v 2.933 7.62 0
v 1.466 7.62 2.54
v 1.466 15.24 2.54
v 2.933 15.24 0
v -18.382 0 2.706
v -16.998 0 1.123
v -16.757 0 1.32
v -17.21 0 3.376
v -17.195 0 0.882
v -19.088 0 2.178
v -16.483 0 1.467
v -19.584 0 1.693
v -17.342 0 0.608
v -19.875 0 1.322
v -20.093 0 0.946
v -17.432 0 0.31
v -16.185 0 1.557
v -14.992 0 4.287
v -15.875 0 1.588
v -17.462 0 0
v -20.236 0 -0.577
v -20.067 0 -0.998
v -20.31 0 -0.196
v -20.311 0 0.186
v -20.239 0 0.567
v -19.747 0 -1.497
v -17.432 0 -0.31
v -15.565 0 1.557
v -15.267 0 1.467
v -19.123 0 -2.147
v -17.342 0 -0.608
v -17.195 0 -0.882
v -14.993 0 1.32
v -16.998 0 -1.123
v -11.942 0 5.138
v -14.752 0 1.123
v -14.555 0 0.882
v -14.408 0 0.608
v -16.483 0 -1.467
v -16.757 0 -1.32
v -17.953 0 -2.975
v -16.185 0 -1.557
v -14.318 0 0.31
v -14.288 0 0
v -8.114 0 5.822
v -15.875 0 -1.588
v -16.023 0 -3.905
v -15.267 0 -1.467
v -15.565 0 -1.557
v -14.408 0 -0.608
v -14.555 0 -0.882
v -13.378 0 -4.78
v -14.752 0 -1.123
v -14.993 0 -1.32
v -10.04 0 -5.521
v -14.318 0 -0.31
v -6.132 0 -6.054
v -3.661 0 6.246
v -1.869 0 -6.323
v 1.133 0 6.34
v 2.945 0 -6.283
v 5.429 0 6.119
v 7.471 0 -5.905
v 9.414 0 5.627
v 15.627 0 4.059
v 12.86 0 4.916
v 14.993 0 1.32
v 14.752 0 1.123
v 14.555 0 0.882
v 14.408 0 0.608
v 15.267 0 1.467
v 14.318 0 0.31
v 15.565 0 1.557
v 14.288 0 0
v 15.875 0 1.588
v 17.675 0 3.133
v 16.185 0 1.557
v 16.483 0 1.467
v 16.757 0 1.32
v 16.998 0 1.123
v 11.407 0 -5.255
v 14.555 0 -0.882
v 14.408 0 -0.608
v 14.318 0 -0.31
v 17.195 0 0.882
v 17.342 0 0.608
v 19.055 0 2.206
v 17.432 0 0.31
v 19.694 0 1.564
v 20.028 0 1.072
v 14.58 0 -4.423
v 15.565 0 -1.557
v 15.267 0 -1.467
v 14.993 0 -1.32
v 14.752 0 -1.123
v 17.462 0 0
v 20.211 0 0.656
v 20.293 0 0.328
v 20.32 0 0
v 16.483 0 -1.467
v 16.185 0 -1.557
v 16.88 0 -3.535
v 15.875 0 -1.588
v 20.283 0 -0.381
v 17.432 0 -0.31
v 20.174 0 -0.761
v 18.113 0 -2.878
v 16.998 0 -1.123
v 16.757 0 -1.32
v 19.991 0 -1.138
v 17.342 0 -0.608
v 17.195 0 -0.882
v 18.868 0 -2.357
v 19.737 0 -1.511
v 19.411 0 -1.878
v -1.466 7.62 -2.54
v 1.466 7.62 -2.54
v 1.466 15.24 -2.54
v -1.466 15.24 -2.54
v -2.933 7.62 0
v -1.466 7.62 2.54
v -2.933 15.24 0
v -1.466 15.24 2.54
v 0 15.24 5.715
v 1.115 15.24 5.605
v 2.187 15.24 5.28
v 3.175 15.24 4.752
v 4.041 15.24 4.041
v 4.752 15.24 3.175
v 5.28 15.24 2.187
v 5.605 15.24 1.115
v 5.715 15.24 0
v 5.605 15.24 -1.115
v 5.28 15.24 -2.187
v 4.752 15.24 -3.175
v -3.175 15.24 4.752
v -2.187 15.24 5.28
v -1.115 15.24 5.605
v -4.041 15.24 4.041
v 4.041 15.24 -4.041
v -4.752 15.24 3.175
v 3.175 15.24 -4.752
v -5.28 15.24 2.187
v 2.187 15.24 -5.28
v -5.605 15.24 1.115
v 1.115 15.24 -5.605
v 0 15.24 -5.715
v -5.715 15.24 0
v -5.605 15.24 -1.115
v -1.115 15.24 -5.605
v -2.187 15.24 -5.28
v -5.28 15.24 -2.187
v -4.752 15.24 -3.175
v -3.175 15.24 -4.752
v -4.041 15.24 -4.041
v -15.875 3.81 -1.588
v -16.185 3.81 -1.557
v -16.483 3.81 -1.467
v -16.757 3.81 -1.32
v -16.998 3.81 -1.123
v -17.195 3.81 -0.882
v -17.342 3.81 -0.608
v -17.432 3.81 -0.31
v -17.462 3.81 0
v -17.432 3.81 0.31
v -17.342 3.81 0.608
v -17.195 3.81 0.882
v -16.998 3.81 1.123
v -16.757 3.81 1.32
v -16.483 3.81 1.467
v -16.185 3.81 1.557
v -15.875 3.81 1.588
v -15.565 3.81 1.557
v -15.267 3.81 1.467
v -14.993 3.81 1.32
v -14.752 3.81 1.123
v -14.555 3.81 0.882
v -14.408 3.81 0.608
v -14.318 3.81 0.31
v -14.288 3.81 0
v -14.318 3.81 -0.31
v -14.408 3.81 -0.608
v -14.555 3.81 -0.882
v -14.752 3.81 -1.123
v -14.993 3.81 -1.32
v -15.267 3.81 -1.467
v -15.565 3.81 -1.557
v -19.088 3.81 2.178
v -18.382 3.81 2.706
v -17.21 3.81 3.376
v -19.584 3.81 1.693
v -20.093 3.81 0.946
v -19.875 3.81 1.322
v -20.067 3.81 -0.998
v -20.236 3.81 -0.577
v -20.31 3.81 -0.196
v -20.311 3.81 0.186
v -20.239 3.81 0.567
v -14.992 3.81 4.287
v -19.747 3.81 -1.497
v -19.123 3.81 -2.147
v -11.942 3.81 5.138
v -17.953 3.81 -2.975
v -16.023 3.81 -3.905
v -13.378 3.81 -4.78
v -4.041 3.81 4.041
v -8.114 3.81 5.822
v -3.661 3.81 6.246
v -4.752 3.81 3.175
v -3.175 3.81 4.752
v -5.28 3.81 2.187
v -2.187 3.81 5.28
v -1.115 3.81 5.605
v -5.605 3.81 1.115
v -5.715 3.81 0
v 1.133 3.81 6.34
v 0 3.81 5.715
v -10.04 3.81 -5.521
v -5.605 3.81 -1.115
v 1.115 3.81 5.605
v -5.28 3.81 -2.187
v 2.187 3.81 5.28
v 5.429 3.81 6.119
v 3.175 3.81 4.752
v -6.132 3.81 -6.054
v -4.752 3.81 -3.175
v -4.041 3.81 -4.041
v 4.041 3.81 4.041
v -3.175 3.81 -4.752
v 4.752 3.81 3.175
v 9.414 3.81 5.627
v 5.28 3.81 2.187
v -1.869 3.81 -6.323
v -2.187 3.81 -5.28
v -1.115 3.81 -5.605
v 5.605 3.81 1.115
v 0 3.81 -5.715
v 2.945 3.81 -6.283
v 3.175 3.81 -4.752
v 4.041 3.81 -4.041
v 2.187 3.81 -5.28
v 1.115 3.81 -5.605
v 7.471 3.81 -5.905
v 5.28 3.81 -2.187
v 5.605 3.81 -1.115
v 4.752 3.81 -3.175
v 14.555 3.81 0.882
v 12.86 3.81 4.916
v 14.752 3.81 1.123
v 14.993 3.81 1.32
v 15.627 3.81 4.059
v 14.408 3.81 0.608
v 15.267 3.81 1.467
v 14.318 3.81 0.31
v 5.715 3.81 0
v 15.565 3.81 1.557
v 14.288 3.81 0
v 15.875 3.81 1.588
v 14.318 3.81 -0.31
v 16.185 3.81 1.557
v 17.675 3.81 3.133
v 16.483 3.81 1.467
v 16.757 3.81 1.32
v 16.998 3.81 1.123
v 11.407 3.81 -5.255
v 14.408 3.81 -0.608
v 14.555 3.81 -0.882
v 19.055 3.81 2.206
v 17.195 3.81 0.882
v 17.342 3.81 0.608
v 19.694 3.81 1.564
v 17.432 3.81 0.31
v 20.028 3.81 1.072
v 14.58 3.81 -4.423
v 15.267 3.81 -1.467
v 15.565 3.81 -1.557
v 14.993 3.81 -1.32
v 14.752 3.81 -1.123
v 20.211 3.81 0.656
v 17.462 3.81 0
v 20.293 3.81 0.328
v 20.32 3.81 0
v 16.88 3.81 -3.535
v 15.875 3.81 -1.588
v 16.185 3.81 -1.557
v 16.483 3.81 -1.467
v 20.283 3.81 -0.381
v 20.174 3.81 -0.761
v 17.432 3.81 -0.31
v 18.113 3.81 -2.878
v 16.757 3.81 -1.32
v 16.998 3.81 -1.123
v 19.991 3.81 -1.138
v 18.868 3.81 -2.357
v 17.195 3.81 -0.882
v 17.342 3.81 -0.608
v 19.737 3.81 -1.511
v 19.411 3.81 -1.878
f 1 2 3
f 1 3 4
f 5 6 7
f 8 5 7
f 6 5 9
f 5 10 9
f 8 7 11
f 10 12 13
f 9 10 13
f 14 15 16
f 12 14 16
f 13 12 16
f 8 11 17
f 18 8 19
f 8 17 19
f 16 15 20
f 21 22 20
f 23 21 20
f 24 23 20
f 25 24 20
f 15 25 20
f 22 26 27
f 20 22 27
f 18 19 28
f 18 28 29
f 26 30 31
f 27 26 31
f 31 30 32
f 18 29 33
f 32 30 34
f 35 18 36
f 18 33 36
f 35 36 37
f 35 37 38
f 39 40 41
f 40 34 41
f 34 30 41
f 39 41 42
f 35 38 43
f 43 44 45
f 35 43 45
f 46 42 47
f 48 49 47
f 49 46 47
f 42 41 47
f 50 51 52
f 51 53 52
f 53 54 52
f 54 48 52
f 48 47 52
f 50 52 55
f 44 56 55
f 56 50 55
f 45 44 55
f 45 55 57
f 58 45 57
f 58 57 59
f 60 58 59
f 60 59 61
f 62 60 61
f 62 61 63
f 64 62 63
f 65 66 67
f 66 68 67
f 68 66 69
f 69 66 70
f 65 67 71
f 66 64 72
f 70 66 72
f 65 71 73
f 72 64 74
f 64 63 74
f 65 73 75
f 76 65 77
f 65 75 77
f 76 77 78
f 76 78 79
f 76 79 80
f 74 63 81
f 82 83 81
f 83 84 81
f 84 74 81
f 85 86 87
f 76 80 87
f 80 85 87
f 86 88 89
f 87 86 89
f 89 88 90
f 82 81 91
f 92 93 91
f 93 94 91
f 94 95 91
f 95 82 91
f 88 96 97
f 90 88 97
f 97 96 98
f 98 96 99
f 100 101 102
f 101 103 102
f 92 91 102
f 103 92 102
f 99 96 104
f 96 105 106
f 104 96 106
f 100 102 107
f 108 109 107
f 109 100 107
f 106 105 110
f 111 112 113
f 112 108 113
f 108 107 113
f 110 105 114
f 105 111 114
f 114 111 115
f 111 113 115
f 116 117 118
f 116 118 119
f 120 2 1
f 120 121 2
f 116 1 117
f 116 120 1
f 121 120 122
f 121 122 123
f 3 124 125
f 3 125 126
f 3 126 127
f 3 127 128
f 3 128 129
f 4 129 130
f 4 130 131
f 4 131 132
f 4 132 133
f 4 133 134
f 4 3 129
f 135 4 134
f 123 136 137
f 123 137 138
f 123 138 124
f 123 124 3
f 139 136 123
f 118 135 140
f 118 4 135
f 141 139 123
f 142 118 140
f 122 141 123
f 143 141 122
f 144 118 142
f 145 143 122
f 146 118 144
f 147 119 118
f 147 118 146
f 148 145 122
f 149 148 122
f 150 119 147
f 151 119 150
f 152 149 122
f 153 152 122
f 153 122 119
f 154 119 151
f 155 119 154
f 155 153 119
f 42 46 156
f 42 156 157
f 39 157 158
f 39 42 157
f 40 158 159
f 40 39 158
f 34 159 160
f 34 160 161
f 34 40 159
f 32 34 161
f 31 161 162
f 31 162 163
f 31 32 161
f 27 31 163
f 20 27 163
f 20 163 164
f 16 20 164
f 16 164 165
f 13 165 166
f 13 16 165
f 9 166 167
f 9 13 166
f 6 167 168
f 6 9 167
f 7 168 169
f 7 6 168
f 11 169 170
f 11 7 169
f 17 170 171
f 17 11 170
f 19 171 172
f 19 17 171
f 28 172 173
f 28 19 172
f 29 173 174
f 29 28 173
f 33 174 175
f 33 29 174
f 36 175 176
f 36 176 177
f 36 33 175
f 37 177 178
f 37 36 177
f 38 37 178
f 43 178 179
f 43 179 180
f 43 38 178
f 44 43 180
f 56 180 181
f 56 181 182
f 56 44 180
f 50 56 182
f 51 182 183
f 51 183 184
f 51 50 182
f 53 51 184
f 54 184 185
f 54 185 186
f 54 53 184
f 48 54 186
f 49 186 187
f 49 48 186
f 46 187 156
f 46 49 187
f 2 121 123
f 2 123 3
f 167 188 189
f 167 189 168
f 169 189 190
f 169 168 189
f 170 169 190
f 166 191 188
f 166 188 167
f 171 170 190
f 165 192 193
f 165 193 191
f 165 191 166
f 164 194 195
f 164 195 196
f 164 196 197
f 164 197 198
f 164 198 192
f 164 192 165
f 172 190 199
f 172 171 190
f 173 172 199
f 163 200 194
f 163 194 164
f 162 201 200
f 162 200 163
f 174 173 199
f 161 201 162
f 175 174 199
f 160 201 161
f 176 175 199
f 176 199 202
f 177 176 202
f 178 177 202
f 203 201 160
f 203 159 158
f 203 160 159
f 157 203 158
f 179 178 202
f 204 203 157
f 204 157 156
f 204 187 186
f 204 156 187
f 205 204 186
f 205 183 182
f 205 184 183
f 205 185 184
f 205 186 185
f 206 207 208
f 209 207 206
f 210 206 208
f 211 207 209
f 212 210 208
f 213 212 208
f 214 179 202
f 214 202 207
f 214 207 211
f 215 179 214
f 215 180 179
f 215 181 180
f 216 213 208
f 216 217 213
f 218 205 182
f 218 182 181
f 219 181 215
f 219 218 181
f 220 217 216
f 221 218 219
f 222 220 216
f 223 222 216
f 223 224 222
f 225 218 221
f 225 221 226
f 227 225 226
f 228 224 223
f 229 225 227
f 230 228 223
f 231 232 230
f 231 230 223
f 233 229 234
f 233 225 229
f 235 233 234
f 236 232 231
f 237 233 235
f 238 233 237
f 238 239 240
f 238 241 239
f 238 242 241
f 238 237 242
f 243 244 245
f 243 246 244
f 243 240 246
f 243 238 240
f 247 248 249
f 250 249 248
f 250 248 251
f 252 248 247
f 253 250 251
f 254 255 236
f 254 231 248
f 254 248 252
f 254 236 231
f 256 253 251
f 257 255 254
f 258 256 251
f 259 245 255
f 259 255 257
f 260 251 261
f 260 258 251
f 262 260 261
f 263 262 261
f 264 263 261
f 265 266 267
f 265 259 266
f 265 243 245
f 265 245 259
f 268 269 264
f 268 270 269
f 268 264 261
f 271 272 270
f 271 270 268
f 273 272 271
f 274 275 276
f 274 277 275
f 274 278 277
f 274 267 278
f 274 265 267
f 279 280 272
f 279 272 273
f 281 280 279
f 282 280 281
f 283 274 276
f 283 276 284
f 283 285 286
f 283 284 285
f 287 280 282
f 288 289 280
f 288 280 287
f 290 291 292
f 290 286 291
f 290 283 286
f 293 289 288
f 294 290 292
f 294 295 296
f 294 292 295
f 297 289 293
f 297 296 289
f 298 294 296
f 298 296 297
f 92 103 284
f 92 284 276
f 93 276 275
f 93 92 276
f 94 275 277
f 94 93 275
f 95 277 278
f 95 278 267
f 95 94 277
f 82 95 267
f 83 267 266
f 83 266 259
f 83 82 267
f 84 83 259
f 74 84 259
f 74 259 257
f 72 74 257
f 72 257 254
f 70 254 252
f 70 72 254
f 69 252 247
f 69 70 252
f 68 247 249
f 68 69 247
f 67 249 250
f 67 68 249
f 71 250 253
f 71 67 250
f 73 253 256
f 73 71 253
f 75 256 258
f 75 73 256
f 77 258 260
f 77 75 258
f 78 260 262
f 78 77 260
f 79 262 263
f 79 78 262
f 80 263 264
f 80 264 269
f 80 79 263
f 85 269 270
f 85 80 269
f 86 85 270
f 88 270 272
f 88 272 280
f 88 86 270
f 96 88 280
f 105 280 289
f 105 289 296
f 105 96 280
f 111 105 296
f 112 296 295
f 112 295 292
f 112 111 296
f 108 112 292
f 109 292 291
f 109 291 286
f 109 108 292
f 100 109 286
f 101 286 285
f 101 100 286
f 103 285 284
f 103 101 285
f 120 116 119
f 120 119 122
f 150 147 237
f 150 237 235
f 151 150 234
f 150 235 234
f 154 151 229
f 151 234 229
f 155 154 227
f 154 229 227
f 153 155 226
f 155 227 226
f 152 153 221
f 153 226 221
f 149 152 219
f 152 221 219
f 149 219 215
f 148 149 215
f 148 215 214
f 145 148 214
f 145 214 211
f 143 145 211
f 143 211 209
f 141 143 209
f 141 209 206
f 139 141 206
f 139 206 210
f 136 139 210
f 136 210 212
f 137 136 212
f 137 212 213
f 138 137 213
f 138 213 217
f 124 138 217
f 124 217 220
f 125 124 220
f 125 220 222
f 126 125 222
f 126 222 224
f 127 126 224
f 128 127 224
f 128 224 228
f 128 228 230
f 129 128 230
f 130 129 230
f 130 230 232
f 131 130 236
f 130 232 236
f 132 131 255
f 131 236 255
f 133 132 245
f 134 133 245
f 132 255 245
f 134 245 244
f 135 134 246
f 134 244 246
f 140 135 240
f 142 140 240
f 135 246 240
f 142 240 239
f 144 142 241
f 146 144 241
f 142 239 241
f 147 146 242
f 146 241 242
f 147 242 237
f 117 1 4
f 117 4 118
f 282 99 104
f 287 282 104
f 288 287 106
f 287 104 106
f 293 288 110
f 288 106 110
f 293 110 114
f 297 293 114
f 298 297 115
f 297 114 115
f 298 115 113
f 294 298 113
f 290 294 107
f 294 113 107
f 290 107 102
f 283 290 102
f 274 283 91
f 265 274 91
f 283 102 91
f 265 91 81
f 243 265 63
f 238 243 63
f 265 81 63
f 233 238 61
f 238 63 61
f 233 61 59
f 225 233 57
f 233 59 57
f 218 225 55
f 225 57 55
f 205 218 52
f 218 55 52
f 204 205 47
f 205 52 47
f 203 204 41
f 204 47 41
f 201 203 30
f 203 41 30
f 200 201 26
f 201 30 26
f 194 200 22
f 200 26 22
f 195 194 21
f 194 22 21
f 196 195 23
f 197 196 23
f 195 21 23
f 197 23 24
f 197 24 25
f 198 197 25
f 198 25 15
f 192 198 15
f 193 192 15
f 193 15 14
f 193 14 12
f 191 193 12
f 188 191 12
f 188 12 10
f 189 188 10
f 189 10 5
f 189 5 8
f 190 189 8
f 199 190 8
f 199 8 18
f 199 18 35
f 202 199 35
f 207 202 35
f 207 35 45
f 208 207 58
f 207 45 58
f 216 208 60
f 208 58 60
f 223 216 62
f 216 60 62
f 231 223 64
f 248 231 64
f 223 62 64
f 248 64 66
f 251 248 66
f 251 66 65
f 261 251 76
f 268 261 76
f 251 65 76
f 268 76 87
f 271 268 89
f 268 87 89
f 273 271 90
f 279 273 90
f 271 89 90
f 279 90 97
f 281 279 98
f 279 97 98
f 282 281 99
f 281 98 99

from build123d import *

# Parameters (mm, degrees)
SKETCH1_RX          = 20.32
SKETCH1_RY          = 6.35
SKETCH1_R           = 1.5875
SKETCH1_R_2         = 5.715
BOSS_EXTRUDE1_DEPTH = 3.81
BOSS_EXTRUDE2_START = 3.81
SKETCH1_3_R         = 5.715
BOSS_EXTRUDE2_DEPTH = 3.81
BOSS_EXTRUDE3_START = 3.81
SKETCH1_4_R         = 5.715
BOSS_EXTRUDE3_DEPTH = 11.43


with BuildPart() as part:
    # Sketch1 → Boss-Extrude1 (new body)
    # profile 1 of 3: a face of its own
    with BuildSketch(Plane(origin=(0, 0, 0), x_dir=(1, 0, 0), z_dir=(0, 1, 0))):
        with Locations((0, 0)):
            Ellipse(SKETCH1_RX, SKETCH1_RY)
        with Locations(Location((-15.875, 0, 0), (0, 0, 90))):
            Circle(SKETCH1_R, mode=Mode.SUBTRACT)
        with Locations(Location((15.875, 0, 0), (0, 0, 90))):
            Circle(SKETCH1_R, mode=Mode.SUBTRACT)
        Circle(SKETCH1_R_2, mode=Mode.SUBTRACT)
    # profile 2 of 3: a face of its own
    with BuildSketch(Plane(origin=(0, 0, 0), x_dir=(1, 0, 0), z_dir=(0, 1, 0))):
        Circle(SKETCH1_R_2)
        Polygon((1.466469684, -2.54), (2.932939367, 0), (1.466469684, 2.54), (-1.466469684, 2.54), (-2.932939367, 0), (-1.466469684, -2.54), align=None, mode=Mode.SUBTRACT)
    # profile 3 of 3: a face of its own
    with BuildSketch(Plane(origin=(0, 0, 0), x_dir=(1, 0, 0), z_dir=(0, 1, 0))):
        Polygon((-1.466469684, -2.54), (1.466469684, -2.54), (2.932939367, 0), (1.466469684, 2.54), (-1.466469684, 2.54), (-2.932939367, 0), align=None)
    extrude(amount=BOSS_EXTRUDE1_DEPTH)

    # Sketch1<3> → Boss-Extrude2 (add)
    # profile 1 of 2: a face of its own
    with BuildSketch(Plane(origin=(0, 0, 0), x_dir=(1, 0, 0), z_dir=(0, 1, 0)).offset(BOSS_EXTRUDE2_START)):
        with Locations(Location((0, 0, 0), (0, 0, 90))):
            Circle(SKETCH1_3_R)
        Polygon((1.466469684, -2.54), (2.932939367, 0), (1.466469684, 2.54), (-1.466469684, 2.54), (-2.932939367, 0), (-1.466469684, -2.54), align=None, mode=Mode.SUBTRACT)
    # profile 2 of 2: a face of its own
    with BuildSketch(Plane(origin=(0, 0, 0), x_dir=(1, 0, 0), z_dir=(0, 1, 0)).offset(BOSS_EXTRUDE2_START)):
        Polygon((-1.466469684, -2.54), (1.466469684, -2.54), (2.932939367, 0), (1.466469684, 2.54), (-1.466469684, 2.54), (-2.932939367, 0), align=None)
    extrude(amount=BOSS_EXTRUDE2_DEPTH)

    # Sketch1<4> → Boss-Extrude3 (add)
    with BuildSketch(Plane(origin=(0, 0, 0), x_dir=(1, 0, 0), z_dir=(0, 1, 0)).offset(BOSS_EXTRUDE3_START)):
        with Locations(Location((0, 0, 0), (0, 0, 90))):
            Circle(SKETCH1_4_R)
        Polygon((1.466469684, -2.54), (2.932939367, 0), (1.466469684, 2.54), (-1.466469684, 2.54), (-2.932939367, 0), (-1.466469684, -2.54), align=None, mode=Mode.SUBTRACT)
    extrude(amount=BOSS_EXTRUDE3_DEPTH)


solid = part.part
